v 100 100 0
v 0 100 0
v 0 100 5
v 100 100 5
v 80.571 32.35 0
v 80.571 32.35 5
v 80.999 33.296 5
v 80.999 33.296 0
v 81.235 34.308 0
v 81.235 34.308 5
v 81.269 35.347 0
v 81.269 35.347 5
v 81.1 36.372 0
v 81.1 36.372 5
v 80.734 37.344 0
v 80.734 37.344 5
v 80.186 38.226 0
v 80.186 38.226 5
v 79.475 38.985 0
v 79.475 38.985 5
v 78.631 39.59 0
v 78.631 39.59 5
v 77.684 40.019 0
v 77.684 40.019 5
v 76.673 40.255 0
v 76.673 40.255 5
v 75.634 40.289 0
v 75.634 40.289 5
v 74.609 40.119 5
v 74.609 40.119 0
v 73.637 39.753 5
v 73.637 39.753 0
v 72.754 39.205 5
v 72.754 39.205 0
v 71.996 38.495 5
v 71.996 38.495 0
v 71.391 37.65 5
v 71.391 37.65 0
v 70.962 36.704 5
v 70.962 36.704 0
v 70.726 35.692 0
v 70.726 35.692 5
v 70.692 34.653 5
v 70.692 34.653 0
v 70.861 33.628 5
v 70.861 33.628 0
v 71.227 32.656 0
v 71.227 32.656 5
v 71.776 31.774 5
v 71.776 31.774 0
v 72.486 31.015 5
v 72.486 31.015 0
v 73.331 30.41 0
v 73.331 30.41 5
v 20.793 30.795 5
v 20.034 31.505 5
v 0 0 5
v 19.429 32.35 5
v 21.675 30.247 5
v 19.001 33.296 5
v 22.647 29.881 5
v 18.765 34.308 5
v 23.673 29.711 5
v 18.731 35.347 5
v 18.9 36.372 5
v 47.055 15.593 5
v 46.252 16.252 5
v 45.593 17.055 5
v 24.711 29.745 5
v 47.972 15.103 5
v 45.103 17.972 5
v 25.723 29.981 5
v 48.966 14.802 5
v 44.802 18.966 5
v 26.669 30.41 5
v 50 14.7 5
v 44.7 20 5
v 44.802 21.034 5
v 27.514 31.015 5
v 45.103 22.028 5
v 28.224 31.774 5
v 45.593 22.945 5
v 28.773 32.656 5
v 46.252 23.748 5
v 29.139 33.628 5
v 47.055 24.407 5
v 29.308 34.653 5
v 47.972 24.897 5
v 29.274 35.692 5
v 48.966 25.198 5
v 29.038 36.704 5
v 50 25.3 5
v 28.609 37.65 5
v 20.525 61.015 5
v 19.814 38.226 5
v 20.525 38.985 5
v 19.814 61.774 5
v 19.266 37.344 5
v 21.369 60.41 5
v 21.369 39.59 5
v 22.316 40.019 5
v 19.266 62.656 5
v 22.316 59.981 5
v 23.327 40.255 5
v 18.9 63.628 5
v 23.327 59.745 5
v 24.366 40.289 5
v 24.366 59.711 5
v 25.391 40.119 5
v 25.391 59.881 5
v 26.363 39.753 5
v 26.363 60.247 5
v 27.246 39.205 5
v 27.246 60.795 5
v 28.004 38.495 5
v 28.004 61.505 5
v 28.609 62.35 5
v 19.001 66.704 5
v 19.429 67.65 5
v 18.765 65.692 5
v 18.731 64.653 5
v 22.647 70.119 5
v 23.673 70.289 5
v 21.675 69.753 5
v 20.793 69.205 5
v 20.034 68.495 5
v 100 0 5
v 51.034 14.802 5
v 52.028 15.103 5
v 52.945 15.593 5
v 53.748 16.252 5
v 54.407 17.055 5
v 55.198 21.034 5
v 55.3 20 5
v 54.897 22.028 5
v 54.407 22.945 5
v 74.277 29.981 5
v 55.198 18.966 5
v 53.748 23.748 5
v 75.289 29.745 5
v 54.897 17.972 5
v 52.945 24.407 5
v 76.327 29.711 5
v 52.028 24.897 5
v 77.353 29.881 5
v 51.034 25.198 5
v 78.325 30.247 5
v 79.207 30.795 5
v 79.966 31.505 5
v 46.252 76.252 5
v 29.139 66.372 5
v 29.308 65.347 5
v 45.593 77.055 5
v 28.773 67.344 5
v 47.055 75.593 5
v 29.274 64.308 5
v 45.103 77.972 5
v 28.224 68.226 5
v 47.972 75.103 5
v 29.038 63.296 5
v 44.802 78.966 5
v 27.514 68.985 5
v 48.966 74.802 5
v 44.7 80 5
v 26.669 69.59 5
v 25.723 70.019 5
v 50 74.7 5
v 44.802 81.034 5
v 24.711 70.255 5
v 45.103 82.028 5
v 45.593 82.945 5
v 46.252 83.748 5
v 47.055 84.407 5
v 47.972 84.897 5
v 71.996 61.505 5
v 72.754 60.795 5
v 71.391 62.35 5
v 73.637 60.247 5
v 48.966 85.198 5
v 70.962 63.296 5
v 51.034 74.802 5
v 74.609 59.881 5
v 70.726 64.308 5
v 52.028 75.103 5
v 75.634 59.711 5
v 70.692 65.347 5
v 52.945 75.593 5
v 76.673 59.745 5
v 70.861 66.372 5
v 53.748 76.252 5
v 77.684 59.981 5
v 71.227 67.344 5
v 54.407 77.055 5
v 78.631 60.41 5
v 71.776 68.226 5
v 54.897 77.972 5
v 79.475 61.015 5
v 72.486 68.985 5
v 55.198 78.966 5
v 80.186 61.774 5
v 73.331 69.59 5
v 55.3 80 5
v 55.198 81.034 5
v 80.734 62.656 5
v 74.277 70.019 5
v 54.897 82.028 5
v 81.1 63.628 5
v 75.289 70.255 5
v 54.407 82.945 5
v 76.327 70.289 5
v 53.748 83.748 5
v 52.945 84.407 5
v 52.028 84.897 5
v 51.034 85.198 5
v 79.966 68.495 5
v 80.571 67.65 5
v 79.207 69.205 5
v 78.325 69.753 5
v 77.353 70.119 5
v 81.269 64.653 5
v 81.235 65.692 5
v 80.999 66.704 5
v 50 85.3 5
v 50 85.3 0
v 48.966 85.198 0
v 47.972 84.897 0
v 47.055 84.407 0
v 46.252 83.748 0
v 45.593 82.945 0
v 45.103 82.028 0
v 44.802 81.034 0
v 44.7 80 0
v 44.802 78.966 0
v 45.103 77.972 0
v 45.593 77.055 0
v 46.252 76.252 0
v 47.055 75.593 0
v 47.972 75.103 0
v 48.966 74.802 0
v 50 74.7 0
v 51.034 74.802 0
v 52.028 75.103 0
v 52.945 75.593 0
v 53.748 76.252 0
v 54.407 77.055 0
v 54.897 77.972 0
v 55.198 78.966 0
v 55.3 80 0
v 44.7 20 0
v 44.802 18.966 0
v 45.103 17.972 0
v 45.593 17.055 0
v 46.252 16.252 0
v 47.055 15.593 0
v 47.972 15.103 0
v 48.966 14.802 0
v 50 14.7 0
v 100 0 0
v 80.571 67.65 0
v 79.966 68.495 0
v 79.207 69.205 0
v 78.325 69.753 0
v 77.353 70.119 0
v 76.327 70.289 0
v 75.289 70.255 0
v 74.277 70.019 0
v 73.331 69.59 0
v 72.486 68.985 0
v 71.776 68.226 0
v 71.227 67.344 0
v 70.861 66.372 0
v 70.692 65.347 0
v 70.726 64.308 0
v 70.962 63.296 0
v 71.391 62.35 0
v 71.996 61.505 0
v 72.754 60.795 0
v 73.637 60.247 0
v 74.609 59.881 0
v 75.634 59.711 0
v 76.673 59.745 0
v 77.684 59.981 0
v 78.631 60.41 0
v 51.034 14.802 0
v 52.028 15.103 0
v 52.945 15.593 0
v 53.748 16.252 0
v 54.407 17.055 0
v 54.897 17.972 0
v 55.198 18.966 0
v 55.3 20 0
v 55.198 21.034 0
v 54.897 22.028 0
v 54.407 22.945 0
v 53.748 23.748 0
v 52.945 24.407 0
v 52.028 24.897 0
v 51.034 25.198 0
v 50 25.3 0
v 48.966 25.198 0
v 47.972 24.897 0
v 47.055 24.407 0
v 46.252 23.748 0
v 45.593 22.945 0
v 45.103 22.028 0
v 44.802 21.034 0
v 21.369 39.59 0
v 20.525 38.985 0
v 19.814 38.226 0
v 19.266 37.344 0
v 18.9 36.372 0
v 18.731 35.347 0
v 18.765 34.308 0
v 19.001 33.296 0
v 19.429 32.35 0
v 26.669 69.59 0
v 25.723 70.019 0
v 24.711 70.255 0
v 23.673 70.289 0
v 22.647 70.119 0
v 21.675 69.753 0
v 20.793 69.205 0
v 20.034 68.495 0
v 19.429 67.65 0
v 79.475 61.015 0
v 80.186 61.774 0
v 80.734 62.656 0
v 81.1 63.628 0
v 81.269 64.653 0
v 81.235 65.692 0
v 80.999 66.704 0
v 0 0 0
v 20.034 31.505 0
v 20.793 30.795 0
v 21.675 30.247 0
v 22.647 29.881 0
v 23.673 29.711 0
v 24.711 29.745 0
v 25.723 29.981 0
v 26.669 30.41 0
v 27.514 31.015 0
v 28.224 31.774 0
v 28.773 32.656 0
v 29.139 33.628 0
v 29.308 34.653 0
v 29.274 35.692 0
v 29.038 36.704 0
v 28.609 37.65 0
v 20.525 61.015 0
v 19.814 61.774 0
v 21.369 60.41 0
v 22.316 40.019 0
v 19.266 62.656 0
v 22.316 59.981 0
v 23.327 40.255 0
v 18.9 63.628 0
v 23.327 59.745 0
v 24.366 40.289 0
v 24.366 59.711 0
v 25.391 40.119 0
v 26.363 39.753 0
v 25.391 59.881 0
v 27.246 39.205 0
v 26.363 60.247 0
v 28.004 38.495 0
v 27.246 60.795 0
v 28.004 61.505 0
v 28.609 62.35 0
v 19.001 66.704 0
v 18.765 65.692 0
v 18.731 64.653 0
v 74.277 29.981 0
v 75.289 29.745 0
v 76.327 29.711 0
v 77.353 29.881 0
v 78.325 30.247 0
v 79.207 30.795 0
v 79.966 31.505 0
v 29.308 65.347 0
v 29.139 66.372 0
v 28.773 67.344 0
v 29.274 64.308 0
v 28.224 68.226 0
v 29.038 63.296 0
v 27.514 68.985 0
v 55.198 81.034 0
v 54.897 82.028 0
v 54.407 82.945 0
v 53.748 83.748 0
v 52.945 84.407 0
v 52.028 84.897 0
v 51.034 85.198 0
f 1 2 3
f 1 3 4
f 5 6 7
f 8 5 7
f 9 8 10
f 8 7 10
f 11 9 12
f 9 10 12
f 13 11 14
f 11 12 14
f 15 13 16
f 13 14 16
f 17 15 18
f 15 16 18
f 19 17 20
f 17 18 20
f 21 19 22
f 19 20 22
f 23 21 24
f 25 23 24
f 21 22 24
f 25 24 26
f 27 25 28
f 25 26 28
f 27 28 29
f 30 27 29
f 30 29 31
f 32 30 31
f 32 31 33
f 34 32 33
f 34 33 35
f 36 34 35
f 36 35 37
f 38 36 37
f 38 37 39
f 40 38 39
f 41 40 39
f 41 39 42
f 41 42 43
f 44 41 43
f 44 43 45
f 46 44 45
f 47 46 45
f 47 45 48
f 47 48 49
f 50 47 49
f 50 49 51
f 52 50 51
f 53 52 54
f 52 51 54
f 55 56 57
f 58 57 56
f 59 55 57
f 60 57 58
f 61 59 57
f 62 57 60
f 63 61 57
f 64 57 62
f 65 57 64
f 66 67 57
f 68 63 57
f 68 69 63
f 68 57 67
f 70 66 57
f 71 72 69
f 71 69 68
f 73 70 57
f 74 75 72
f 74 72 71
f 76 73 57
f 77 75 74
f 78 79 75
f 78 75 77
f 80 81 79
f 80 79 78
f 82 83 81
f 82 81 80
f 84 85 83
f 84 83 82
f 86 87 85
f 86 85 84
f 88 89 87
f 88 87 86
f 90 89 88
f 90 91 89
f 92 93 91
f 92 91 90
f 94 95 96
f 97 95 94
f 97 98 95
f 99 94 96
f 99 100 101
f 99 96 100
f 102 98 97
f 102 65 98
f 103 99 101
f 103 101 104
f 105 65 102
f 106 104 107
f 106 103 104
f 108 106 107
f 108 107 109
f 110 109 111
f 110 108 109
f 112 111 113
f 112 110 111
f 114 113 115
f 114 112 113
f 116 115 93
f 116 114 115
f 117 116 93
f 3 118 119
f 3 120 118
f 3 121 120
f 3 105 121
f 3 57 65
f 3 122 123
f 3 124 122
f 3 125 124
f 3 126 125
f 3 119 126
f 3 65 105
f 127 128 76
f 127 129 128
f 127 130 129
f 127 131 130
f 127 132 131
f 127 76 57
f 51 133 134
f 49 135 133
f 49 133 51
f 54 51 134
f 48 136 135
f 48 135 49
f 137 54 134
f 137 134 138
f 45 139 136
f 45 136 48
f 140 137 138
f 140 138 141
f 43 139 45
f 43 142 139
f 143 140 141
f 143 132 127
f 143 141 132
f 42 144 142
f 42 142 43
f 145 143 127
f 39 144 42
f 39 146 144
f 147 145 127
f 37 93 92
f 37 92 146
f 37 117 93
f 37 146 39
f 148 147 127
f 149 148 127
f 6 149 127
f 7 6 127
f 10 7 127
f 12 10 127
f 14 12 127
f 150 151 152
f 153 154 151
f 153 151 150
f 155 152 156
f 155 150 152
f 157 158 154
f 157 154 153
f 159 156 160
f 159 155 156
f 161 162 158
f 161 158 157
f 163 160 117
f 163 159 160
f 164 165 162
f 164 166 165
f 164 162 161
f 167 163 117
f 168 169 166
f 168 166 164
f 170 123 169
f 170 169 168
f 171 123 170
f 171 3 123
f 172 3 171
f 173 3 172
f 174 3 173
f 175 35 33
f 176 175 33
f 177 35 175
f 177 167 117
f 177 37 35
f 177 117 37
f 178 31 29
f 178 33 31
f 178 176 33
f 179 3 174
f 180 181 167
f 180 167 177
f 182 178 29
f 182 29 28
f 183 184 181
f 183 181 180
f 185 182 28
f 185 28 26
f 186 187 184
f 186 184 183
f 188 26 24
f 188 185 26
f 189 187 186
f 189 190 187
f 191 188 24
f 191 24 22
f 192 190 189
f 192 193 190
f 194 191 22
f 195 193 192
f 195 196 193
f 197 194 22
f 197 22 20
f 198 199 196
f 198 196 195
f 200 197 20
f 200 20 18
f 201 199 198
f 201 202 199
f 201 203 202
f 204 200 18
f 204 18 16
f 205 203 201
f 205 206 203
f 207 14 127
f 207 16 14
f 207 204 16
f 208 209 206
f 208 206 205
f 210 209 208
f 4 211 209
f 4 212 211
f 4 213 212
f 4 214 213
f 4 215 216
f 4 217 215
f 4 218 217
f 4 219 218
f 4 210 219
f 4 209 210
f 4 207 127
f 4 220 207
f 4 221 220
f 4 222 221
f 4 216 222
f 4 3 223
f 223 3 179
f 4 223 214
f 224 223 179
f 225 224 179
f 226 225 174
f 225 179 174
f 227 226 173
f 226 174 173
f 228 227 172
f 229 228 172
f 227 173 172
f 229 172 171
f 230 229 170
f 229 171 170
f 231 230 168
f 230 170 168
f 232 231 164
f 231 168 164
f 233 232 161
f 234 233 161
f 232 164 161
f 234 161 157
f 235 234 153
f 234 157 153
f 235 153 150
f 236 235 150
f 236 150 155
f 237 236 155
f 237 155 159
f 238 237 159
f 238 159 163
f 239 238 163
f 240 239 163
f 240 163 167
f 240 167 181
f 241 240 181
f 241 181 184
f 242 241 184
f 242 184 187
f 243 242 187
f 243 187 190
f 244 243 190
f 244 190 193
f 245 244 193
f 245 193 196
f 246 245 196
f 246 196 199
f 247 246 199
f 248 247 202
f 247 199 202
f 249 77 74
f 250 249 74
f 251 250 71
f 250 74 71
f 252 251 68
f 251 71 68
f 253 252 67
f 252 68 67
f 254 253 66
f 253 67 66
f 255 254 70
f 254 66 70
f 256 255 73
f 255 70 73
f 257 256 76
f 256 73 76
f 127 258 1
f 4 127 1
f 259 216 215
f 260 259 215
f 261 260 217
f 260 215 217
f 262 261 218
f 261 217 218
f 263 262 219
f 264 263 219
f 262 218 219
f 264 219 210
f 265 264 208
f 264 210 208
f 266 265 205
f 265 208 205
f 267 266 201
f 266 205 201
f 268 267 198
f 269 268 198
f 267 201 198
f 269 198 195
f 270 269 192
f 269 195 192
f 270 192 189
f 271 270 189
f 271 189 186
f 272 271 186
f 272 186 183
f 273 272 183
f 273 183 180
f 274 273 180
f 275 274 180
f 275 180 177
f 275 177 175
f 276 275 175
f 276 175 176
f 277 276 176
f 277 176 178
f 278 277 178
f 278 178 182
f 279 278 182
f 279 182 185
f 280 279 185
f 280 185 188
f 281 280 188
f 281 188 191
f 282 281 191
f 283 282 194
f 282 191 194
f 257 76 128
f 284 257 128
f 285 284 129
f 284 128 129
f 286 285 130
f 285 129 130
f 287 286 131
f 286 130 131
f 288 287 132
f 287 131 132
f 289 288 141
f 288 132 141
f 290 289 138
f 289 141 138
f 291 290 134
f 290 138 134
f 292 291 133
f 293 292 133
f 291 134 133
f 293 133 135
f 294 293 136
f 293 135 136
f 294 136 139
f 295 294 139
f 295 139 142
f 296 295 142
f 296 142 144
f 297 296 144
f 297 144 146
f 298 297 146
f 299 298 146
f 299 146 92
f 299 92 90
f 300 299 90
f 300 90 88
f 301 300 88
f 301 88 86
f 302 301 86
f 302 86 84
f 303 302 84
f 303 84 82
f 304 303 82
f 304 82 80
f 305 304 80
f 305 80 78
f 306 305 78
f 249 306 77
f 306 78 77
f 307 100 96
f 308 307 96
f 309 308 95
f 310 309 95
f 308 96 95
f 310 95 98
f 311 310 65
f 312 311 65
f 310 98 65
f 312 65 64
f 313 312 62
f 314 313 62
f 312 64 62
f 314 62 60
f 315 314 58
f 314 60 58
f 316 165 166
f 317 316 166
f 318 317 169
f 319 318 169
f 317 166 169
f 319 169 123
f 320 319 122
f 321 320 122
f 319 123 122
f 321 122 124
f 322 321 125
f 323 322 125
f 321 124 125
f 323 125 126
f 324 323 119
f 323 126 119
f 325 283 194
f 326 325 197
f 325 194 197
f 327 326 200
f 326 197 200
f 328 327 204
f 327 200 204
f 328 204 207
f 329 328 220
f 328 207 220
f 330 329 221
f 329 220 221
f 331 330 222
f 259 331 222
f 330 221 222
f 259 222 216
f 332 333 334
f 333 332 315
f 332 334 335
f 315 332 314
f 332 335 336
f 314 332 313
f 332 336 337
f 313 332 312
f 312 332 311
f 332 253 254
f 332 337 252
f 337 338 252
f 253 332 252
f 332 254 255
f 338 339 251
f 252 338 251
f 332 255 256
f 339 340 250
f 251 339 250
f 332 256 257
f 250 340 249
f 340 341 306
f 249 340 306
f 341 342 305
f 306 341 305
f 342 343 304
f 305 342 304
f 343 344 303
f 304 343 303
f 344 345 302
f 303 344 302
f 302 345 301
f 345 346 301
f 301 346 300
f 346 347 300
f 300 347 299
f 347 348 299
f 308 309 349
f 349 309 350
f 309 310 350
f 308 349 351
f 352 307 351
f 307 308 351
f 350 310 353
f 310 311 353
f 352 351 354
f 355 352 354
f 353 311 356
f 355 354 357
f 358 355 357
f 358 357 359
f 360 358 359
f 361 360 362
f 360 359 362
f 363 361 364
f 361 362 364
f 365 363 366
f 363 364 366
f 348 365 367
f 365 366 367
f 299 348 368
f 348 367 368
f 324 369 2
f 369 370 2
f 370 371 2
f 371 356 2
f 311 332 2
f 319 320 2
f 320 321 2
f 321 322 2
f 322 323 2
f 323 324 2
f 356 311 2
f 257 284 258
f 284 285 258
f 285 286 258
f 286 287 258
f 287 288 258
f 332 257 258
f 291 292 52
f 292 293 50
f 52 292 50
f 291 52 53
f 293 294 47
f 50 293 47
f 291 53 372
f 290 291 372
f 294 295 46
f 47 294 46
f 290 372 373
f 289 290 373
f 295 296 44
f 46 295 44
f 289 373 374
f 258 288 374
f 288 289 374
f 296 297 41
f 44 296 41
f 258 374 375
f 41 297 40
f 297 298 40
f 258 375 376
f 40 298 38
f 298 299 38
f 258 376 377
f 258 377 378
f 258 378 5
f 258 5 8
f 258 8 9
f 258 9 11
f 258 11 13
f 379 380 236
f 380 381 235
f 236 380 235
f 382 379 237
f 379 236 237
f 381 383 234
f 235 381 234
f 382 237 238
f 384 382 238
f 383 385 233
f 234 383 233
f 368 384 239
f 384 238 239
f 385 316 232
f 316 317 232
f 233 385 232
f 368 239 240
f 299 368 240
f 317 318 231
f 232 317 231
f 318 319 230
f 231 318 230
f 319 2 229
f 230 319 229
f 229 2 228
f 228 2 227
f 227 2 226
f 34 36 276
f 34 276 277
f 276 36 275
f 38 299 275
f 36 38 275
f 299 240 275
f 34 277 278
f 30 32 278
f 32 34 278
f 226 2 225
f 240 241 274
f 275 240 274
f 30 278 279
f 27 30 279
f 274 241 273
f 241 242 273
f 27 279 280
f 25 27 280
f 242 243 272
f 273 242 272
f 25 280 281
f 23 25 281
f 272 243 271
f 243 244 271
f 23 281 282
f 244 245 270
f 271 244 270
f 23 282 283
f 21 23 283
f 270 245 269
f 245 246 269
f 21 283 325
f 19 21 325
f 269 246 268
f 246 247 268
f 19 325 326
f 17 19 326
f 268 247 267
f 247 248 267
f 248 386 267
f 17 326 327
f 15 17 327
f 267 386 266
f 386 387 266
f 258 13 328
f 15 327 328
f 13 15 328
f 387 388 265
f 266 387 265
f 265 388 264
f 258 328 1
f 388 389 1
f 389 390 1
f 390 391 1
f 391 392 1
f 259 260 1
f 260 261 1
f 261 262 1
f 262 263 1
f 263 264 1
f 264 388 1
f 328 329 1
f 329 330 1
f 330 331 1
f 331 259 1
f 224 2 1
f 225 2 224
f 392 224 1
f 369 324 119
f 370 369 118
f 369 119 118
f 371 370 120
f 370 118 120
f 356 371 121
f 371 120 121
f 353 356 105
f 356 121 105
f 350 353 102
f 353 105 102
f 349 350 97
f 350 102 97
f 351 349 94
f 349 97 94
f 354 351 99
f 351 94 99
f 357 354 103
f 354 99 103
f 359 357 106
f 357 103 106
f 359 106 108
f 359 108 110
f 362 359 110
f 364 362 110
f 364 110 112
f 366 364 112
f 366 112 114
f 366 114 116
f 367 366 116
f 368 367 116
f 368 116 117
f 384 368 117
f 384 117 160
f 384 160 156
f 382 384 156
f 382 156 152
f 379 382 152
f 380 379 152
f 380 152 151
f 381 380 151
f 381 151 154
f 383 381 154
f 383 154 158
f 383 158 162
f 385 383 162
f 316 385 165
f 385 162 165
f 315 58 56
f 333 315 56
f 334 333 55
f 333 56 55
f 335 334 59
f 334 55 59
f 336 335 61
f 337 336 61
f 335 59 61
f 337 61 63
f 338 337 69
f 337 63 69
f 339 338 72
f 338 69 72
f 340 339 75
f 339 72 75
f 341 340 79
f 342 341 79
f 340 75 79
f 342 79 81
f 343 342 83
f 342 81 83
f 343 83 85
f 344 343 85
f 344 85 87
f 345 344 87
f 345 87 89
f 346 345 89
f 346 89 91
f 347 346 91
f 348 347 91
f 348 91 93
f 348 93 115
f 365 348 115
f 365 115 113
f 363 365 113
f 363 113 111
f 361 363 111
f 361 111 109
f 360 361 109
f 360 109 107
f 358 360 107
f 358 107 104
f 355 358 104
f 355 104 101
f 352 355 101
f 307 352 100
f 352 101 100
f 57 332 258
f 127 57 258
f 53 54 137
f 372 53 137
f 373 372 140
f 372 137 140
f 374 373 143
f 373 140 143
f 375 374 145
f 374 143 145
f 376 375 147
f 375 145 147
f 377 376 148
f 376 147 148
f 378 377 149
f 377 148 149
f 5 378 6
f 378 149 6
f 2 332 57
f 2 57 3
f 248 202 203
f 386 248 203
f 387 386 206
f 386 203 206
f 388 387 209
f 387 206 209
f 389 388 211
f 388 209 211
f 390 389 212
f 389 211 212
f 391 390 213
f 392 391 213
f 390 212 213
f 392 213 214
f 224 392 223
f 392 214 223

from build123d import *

# Parameters (mm, degrees)
F0_W            = 100
F0_H            = 100
F1_DEPTH        = 5
F3_DEPTH        = 25
F3_COPIES_COUNT = 6


# Not quite as in the source:
# - a pattern or mirror of a feature is missing from the dataset's text; its kind, count and spacing are read off the source's solid


with BuildPart() as f1:
    # F0 (on Top) → F1 (new body)
    with BuildSketch(Plane.XY):
        with Locations((50, 50)):
            Rectangle(F0_W, F0_H)
    extrude(amount=F1_DEPTH)

    # F2 (on face) → F3 (cut)
    with BuildSketch(Plane.XY.offset(5)):
        with BuildLine():
            ThreePointArc((50, 85.3), (46.2523340597, 76.2523340597), (55.3, 80))
            ThreePointArc((55.3, 80), (53.7476659403, 83.7476659403), (50, 85.3))
        make_face()
    f3 = extrude(amount=-F3_DEPTH, mode=Mode.SUBTRACT)

    # F3_copies: F3 ×6 about axis
    f3_copies_axis = Axis((50, 50, 0), (0, 0, 1))
    for i in range(1, F3_COPIES_COUNT):
        add(f3.rotate(f3_copies_axis, i * 360 / F3_COPIES_COUNT), mode=Mode.SUBTRACT)


solid = f1.part
